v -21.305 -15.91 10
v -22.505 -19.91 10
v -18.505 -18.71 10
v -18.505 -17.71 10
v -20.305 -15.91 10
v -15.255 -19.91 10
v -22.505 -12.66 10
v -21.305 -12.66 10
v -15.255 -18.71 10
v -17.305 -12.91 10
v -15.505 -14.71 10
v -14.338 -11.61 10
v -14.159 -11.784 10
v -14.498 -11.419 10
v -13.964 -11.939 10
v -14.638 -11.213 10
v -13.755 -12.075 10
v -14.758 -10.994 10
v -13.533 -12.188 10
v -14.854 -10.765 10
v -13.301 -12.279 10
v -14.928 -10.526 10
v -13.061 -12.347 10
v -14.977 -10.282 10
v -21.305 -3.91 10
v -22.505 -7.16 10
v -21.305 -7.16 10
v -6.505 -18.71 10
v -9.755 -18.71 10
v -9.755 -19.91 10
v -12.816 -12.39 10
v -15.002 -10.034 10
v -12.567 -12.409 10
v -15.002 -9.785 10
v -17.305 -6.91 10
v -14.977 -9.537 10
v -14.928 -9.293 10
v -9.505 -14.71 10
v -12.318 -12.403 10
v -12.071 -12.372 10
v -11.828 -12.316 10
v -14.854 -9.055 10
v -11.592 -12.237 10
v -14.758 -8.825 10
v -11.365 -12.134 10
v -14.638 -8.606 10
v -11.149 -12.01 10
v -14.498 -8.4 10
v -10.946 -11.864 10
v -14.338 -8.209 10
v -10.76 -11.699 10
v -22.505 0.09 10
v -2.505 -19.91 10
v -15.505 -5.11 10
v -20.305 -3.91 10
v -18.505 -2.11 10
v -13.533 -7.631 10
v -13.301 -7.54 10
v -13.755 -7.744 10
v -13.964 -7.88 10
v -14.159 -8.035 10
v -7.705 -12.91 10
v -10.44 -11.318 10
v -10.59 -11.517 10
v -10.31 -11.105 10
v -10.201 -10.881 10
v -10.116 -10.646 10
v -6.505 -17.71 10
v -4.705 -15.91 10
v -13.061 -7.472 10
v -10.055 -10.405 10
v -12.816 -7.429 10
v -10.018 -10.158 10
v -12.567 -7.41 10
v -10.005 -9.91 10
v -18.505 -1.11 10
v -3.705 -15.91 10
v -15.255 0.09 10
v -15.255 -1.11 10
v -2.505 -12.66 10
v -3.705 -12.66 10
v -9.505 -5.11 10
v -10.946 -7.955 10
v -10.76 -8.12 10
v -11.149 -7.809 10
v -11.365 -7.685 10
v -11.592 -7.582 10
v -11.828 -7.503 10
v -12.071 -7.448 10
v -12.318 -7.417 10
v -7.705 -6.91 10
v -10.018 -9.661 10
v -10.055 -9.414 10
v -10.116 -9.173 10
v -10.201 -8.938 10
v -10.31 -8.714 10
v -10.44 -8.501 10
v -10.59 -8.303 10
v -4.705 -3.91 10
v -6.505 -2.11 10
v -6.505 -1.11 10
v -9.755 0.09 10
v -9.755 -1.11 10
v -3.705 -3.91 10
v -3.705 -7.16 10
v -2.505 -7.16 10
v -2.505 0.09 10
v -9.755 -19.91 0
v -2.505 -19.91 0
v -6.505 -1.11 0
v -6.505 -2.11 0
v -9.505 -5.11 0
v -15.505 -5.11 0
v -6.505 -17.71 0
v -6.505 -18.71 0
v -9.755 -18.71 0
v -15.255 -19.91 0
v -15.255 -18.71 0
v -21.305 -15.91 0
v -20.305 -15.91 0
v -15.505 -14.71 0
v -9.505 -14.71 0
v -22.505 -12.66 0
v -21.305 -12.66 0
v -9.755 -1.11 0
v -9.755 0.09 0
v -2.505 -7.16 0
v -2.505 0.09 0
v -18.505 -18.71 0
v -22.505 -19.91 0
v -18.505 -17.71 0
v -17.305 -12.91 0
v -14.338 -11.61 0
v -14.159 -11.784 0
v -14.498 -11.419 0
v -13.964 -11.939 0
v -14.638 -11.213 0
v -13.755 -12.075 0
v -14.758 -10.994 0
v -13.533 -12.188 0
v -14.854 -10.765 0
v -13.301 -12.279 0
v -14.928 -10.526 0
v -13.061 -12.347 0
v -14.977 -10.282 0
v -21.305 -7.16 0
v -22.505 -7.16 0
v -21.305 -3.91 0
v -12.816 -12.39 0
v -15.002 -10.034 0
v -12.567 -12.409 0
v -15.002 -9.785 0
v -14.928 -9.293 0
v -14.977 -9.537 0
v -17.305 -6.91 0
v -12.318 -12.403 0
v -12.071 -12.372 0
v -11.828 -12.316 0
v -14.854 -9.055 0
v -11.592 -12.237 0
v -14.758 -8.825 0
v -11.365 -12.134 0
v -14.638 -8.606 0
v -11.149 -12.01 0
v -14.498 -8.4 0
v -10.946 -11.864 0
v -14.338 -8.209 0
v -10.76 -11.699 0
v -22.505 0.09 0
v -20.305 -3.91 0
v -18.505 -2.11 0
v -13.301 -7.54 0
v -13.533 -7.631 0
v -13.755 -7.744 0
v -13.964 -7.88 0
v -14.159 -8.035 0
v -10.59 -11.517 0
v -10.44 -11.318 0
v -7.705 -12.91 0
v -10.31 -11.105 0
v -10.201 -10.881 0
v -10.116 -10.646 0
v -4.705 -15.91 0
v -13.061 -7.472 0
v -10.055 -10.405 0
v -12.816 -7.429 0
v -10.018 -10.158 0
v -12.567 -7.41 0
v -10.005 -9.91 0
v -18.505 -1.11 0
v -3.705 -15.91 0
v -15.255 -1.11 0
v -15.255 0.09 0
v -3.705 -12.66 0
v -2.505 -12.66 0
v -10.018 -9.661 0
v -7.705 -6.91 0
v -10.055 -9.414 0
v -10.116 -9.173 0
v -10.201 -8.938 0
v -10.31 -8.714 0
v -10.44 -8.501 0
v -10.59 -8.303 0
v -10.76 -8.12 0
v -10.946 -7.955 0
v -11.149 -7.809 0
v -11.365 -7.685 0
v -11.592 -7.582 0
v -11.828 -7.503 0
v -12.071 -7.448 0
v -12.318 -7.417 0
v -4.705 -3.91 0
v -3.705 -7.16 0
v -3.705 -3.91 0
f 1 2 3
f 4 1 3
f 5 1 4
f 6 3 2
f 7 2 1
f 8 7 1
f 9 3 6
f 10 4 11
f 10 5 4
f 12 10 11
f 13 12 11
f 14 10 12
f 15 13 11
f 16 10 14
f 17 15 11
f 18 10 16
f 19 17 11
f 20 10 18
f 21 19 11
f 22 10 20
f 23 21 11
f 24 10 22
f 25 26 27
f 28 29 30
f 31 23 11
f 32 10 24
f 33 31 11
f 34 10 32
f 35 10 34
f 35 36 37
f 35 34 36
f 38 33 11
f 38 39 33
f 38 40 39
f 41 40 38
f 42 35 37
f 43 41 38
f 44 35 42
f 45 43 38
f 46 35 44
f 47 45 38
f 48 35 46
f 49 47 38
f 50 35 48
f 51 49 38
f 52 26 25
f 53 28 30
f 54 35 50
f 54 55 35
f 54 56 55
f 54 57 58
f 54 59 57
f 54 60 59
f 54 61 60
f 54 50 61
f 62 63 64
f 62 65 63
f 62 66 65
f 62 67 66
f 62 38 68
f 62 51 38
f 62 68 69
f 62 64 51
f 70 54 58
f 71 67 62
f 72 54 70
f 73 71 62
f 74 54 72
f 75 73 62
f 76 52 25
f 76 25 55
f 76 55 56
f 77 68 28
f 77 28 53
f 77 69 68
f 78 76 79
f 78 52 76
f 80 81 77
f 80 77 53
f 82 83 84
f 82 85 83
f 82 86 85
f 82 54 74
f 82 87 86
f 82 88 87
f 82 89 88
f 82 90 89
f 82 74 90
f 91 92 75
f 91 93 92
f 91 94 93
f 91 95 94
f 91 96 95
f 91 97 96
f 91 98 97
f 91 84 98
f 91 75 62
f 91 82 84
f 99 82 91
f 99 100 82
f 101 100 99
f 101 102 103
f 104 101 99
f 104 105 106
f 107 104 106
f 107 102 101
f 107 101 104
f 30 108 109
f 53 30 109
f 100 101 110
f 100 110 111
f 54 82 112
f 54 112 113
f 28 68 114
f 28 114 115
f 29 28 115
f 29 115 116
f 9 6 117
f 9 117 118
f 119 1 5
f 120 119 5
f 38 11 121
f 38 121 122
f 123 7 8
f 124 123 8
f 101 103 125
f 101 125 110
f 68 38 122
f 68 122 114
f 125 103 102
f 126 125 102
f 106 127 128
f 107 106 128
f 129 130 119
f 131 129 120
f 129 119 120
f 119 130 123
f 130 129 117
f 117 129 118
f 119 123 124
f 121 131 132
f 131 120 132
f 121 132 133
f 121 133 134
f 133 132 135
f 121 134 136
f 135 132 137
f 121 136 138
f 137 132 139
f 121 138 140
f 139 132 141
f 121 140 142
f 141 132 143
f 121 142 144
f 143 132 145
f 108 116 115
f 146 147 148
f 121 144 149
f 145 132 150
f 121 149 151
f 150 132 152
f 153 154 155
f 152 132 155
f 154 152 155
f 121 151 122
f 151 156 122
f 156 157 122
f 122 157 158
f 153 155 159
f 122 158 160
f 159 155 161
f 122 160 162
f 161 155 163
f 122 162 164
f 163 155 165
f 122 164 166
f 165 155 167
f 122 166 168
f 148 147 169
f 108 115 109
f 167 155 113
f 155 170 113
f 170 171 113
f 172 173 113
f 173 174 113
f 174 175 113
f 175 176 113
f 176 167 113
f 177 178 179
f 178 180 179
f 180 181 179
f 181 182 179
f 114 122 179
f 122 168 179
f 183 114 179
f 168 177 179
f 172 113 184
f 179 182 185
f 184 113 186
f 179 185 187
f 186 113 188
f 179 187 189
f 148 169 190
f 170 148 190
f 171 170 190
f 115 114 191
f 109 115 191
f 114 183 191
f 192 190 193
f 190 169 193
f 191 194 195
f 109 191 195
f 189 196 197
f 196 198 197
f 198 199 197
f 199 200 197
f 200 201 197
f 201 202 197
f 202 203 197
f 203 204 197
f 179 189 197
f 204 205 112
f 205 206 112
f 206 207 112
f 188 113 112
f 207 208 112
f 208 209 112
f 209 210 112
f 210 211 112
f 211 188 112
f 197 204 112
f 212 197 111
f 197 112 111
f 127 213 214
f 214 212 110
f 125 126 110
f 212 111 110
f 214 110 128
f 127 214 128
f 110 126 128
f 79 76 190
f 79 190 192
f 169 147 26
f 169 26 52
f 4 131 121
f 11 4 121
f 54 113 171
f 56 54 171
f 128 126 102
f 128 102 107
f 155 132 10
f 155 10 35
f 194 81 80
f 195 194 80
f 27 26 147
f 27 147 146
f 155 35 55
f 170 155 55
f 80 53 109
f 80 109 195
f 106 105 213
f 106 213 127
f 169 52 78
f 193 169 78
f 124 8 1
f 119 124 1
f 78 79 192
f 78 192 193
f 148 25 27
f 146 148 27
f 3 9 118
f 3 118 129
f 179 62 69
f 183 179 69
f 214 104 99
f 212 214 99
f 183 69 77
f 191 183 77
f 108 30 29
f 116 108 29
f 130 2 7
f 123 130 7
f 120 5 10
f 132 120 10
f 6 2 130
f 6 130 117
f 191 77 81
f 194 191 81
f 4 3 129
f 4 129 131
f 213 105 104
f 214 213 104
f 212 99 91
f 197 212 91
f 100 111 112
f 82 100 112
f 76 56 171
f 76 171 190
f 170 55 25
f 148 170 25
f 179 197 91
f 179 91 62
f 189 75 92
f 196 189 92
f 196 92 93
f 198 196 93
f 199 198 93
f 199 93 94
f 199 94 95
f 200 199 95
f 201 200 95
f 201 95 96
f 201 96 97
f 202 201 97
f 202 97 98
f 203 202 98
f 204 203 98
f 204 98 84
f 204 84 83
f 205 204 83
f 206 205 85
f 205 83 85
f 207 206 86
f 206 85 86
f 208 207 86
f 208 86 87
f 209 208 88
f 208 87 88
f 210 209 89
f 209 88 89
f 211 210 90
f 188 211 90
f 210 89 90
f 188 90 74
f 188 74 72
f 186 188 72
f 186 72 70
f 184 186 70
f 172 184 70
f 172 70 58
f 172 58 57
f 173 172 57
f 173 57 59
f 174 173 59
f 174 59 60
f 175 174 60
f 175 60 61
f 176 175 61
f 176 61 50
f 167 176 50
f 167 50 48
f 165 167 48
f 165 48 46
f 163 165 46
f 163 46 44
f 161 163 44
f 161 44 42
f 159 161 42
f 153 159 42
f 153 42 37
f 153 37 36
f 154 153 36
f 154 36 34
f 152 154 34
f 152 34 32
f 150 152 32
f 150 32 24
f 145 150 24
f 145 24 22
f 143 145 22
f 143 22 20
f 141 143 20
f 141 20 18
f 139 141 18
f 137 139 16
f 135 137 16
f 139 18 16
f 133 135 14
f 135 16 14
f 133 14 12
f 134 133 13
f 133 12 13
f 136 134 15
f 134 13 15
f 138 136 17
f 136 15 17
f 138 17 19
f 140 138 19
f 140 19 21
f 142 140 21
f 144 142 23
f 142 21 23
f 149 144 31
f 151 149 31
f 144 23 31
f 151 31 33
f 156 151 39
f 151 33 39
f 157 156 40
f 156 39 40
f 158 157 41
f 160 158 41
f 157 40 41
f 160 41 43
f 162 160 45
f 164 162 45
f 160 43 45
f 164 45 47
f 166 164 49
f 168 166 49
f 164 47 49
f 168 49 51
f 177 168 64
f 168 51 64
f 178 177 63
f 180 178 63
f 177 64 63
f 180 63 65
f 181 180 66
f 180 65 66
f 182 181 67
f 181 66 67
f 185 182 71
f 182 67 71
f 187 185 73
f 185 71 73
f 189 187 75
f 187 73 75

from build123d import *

# Parameters (mm, degrees)
ESQUISSE1_W             = 20
ESQUISSE1_H             = 20
BOSS_EXTRU_1_DEPTH      = 10
ESQUISSE2_W             = 1.2
ESQUISSE2_H             = 5.5
ESQUISSE2_W_2           = 5.5
ESQUISSE2_H_2           = 1.2
ENL_V_MAT_EXTRU_1_DEPTH = 11
ENL_V_MAT_EXTRU_2_DEPTH = 11
ESQUISSE4_R             = 2.5
ENL_V_MAT_EXTRU_3_DEPTH = 11


with BuildPart() as part:
    # Esquisse1 → Boss.-Extru.1 (new body)
    with BuildSketch(Plane.XY):
        with Locations((-12.505109137, -9.909560068)):
            Rectangle(ESQUISSE1_W, ESQUISSE1_H)
    extrude(amount=BOSS_EXTRU_1_DEPTH)

    # Esquisse2 → Enlèv. mat.-Extru.1 (cut, through all)
    with BuildSketch(Plane.XY.offset(10)):
        with Locations((-21.905109137, -9.909560068)):
            Rectangle(ESQUISSE2_W, ESQUISSE2_H)
        with Locations((-12.505109137, -0.509560068)):
            Rectangle(ESQUISSE2_W_2, ESQUISSE2_H_2)
        with Locations((-3.105109137, -9.909560068)):
            Rectangle(ESQUISSE2_W, ESQUISSE2_H)
        with Locations((-12.505109137, -19.309560068)):
            Rectangle(ESQUISSE2_W_2, ESQUISSE2_H_2)
    extrude(amount=-ENL_V_MAT_EXTRU_1_DEPTH, mode=Mode.SUBTRACT)

    # Esquisse3 → Enlèv. mat.-Extru.2 (cut, through all)
    with BuildSketch(Plane.XY.offset(10)):
        Polygon((-21.305109137, -15.909560068), (-20.305109137, -15.909560068), (-17.305109137, -12.909560068), (-17.305109137, -6.909560068), (-20.305109137, -3.909560068), (-21.305109137, -3.909560068), align=None)
        Polygon((-18.505109137, -1.109560068), (-6.505109137, -1.109560068), (-6.505109137, -2.109560068), (-9.505109137, -5.109560068), (-15.505109137, -5.109560068), (-18.505109137, -2.109560068), align=None)
        Polygon((-3.705109137, -3.909560068), (-4.705109137, -3.909560068), (-7.705109137, -6.909560068), (-7.705109137, -12.909560068), (-4.705109137, -15.909560068), (-3.705109137, -15.909560068), align=None)
        Polygon((-6.505109137, -18.709560068), (-18.505109137, -18.709560068), (-18.505109137, -17.709560068), (-15.505109137, -14.709560068), (-9.505109137, -14.709560068), (-6.505109137, -17.709560068), align=None)
    extrude(amount=-ENL_V_MAT_EXTRU_2_DEPTH, mode=Mode.SUBTRACT)

    # Esquisse4 → Enlèv. mat.-Extru.3 (cut, through all)
    with BuildSketch(Plane.XY.offset(10)):
        with Locations((-12.505109137, -9.909560068)):
            Circle(ESQUISSE4_R)
    extrude(amount=-ENL_V_MAT_EXTRU_3_DEPTH, mode=Mode.SUBTRACT)


solid = part.part
